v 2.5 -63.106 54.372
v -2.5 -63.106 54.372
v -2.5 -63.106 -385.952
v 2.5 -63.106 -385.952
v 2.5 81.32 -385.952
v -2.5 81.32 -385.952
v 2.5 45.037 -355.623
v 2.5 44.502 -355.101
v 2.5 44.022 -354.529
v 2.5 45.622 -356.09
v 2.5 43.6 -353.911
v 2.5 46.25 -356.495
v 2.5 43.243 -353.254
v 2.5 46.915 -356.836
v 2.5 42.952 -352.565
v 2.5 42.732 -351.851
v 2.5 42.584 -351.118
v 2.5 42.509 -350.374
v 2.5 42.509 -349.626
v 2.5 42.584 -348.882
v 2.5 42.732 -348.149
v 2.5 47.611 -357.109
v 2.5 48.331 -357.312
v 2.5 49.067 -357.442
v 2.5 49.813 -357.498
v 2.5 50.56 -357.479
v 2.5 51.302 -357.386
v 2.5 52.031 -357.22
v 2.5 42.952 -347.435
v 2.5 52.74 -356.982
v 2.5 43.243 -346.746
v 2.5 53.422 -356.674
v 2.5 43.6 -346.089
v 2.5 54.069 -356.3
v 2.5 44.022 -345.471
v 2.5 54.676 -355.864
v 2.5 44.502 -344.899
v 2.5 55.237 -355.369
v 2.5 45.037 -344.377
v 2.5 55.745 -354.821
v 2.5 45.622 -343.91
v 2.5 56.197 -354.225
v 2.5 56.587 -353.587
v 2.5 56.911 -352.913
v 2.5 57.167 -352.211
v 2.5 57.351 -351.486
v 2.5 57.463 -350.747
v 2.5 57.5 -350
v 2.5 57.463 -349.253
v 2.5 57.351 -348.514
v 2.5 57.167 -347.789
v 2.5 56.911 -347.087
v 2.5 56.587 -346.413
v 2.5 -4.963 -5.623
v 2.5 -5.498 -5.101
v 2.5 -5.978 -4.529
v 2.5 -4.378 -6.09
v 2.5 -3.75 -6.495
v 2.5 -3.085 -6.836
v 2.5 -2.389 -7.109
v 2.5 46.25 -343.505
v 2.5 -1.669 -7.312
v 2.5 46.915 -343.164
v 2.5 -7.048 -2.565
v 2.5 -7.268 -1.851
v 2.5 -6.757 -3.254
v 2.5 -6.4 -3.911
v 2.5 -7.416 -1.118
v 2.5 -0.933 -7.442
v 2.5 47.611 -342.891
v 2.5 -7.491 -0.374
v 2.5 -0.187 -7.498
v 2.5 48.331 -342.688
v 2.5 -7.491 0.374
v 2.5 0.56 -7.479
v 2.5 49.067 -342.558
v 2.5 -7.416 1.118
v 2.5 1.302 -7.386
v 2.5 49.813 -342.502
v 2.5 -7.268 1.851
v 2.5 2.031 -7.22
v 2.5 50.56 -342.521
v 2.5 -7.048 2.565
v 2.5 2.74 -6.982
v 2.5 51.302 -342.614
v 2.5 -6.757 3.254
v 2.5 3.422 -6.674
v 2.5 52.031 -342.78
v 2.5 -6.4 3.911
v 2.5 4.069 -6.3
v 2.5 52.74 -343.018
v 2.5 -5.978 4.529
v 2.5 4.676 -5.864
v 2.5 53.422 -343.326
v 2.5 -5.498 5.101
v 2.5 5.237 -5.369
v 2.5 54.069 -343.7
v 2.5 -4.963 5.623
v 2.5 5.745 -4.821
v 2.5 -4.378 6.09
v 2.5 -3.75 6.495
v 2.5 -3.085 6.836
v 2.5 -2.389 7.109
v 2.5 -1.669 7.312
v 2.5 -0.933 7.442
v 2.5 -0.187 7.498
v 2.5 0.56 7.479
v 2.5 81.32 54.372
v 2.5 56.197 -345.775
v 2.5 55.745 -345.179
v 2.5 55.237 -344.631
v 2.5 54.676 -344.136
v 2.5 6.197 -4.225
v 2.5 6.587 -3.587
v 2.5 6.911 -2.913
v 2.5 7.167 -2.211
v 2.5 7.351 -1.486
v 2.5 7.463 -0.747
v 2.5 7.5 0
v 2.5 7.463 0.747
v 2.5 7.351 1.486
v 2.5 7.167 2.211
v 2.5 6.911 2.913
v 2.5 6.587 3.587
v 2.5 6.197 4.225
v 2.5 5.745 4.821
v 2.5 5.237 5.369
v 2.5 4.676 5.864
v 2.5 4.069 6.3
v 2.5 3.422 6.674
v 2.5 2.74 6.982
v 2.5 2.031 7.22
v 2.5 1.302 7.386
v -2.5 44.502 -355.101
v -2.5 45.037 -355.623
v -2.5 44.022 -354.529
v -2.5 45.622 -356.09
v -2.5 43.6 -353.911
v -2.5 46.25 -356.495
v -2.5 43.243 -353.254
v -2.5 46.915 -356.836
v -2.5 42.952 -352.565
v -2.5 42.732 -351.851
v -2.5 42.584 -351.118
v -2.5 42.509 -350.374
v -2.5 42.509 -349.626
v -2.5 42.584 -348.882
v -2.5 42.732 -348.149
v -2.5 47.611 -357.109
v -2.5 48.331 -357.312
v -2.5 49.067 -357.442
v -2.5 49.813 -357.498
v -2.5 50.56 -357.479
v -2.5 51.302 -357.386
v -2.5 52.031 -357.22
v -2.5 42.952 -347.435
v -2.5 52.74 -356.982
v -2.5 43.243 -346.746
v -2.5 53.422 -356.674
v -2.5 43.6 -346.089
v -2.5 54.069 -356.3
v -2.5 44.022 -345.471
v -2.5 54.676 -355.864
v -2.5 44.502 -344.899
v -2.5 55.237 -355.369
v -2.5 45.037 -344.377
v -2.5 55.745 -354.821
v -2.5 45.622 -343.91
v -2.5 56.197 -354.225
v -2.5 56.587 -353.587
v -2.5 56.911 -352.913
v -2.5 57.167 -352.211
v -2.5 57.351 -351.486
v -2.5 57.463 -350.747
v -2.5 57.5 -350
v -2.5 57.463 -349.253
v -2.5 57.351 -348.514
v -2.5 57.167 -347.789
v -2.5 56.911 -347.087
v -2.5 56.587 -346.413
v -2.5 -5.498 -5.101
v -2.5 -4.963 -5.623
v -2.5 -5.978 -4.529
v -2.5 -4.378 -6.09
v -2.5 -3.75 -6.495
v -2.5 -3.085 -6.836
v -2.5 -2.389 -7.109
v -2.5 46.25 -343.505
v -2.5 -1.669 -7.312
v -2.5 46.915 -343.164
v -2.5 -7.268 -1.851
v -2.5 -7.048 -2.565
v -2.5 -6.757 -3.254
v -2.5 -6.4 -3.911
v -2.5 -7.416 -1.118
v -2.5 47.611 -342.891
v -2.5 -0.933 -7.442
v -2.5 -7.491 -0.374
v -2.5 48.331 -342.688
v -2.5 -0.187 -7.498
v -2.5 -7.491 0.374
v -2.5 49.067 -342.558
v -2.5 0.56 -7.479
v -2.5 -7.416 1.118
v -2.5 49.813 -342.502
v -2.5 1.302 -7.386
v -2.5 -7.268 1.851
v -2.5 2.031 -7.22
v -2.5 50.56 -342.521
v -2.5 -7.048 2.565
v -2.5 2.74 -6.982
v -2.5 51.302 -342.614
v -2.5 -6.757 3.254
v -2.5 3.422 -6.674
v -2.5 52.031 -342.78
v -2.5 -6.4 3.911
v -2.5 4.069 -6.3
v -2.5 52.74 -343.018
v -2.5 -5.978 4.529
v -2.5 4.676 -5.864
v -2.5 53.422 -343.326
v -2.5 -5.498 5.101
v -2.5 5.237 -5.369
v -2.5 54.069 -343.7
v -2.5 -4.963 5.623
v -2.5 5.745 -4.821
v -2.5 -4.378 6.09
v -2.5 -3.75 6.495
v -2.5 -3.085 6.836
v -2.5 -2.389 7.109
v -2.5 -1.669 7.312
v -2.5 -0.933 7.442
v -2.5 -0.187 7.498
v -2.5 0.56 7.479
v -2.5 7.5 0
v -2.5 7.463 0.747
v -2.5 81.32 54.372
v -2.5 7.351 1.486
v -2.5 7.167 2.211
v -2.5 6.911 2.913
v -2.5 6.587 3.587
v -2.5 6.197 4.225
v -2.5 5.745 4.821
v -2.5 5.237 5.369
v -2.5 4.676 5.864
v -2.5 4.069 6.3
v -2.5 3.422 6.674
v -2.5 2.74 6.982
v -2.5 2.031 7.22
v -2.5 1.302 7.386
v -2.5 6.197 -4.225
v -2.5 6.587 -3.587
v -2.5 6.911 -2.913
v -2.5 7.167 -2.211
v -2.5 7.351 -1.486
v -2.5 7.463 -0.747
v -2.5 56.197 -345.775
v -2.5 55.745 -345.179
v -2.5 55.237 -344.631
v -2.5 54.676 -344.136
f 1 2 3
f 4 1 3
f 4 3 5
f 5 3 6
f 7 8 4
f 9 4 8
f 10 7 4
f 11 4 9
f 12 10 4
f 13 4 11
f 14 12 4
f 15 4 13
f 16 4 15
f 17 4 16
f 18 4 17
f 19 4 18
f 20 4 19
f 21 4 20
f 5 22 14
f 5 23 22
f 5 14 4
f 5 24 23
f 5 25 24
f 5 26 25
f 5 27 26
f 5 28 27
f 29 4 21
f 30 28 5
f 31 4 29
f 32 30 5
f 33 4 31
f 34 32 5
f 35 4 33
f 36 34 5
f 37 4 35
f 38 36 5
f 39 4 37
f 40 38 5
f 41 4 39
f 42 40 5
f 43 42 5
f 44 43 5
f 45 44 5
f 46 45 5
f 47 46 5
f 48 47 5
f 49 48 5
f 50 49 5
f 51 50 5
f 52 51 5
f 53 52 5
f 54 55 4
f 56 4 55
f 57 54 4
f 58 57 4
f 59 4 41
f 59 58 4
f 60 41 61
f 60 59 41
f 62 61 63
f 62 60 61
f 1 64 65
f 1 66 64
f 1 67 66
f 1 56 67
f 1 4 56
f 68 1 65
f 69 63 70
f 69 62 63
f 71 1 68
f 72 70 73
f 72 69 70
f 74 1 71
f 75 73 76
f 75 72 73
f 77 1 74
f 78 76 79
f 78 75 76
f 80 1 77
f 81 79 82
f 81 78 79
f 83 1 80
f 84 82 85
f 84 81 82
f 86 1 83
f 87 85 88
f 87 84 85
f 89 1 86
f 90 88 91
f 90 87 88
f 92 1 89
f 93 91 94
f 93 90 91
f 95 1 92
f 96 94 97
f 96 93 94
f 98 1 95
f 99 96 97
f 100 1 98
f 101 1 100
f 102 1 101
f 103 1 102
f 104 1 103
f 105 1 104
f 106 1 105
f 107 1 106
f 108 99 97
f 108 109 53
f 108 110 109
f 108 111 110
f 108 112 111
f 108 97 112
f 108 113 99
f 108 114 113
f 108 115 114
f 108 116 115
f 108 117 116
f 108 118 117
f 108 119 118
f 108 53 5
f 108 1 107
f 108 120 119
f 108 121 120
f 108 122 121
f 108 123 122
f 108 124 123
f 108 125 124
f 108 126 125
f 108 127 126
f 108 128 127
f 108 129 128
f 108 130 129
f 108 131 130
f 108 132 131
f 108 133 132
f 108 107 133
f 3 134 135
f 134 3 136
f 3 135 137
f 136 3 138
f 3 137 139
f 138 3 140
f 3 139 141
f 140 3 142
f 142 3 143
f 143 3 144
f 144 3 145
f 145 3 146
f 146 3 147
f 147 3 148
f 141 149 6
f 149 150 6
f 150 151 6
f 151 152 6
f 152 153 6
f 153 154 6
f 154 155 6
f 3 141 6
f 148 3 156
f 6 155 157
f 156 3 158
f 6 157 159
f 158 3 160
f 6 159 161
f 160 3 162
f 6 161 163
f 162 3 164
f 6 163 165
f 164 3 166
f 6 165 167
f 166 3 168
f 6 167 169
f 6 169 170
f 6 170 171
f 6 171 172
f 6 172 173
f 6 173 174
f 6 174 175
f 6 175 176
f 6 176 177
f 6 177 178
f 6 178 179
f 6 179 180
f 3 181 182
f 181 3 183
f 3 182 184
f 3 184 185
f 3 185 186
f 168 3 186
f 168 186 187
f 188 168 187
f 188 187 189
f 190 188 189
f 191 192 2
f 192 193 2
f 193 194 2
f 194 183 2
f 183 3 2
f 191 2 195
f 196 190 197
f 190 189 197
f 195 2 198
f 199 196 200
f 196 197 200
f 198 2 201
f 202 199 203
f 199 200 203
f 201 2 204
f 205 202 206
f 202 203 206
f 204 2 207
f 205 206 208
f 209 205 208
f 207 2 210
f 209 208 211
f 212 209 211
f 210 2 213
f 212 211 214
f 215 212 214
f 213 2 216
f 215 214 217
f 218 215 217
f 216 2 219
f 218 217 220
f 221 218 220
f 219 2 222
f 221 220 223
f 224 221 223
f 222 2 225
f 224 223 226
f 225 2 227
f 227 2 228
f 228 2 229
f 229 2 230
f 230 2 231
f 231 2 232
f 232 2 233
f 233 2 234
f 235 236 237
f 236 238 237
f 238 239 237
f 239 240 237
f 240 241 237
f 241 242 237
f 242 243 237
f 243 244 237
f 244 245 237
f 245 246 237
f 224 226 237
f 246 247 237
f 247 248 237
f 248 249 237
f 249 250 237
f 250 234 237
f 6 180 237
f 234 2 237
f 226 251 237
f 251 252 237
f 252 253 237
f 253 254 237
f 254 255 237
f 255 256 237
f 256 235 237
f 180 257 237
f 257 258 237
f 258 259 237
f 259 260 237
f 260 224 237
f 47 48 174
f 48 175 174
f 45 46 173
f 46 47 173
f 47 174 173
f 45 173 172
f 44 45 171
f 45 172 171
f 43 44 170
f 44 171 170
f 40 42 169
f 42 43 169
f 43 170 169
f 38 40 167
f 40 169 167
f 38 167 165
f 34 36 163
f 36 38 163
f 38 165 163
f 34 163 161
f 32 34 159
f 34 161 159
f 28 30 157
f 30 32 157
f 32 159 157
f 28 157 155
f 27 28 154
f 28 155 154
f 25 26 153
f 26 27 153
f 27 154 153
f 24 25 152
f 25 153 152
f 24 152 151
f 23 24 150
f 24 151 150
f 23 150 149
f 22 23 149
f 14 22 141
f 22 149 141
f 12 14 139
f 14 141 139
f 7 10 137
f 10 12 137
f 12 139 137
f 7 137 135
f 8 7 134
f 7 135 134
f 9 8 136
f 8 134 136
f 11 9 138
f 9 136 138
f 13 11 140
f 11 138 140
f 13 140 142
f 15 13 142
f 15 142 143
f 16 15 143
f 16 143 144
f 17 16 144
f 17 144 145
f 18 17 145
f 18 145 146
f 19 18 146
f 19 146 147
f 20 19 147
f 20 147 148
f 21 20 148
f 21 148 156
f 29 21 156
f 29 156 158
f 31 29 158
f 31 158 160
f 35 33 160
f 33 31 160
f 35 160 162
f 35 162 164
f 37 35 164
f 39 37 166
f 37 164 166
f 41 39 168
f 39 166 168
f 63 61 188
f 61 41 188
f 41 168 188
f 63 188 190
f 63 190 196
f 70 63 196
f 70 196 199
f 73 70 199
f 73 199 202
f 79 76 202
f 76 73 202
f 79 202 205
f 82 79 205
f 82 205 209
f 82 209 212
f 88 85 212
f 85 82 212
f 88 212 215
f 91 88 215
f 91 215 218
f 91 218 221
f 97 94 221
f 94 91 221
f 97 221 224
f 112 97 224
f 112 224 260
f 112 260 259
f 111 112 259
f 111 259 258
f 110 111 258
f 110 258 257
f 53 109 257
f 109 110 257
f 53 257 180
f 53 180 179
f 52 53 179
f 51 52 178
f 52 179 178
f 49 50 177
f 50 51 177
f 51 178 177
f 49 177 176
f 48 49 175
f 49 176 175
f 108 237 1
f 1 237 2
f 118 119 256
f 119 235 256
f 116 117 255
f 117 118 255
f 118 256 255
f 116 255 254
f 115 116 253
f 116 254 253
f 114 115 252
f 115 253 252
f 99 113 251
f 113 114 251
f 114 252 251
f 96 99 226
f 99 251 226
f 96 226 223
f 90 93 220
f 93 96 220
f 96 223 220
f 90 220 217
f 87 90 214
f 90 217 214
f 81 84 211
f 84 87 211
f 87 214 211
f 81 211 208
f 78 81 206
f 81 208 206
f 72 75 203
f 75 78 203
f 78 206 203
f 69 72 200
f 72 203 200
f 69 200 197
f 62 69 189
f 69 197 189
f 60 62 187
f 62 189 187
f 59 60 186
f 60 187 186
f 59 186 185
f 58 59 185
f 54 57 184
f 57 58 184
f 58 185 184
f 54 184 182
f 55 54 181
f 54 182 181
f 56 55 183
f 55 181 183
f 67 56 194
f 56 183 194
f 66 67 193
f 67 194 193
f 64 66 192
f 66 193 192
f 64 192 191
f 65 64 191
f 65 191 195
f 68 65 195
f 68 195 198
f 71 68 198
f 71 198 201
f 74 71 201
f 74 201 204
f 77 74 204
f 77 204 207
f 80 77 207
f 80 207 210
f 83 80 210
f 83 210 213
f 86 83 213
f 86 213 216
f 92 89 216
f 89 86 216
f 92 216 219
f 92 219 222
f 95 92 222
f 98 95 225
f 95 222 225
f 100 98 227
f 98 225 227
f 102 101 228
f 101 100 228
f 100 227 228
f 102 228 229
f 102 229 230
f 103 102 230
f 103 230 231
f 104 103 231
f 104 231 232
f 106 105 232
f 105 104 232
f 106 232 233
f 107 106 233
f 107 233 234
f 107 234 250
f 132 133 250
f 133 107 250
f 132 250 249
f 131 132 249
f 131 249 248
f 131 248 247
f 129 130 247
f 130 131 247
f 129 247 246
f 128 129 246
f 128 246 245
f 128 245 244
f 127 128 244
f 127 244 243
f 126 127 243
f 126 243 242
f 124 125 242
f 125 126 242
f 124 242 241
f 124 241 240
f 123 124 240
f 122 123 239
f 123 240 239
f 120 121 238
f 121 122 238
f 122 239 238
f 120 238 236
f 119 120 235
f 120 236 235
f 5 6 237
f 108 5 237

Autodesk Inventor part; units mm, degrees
ref_plane "YZ Plane" through (0, 0, 0) normal (1, 0, 0) x (0, 1, 0)
ref_plane "XZ Plane" through (0, 0, 0) normal (0, 1, 0) x (-1, 0, 0)
ref_plane "XY Plane" through (0, 0, 0) normal (0, 0, 1) x (1, 0, 0)
sketch "スケッチ1" plane through (0, 0, 0) normal (1, 0, 0) x (0, 1, 0)
  circle A0 centre (0, 0) radius 7.5
  circle A1 centre (50, -350) radius 7.5
  line L0 (81.3202, 54.372) -> (-63.1061, 54.372)
  line L1 (-63.1061, 54.372) -> (-63.1061, -385.952)
  line L2 (-63.1061, -385.952) -> (81.3202, -385.952)
  line L3 (81.3202, -385.952) -> (81.3202, 54.372)
  dimension "d0" = 50
  dimension "d1" = 350
  dimension "d2" = 15
  dimension "d3" = 15
extrude "押し出し1" add sketch "スケッチ1" along normal mid plane 5
properties part number "stay" material "鉄、可鍛鉄"
